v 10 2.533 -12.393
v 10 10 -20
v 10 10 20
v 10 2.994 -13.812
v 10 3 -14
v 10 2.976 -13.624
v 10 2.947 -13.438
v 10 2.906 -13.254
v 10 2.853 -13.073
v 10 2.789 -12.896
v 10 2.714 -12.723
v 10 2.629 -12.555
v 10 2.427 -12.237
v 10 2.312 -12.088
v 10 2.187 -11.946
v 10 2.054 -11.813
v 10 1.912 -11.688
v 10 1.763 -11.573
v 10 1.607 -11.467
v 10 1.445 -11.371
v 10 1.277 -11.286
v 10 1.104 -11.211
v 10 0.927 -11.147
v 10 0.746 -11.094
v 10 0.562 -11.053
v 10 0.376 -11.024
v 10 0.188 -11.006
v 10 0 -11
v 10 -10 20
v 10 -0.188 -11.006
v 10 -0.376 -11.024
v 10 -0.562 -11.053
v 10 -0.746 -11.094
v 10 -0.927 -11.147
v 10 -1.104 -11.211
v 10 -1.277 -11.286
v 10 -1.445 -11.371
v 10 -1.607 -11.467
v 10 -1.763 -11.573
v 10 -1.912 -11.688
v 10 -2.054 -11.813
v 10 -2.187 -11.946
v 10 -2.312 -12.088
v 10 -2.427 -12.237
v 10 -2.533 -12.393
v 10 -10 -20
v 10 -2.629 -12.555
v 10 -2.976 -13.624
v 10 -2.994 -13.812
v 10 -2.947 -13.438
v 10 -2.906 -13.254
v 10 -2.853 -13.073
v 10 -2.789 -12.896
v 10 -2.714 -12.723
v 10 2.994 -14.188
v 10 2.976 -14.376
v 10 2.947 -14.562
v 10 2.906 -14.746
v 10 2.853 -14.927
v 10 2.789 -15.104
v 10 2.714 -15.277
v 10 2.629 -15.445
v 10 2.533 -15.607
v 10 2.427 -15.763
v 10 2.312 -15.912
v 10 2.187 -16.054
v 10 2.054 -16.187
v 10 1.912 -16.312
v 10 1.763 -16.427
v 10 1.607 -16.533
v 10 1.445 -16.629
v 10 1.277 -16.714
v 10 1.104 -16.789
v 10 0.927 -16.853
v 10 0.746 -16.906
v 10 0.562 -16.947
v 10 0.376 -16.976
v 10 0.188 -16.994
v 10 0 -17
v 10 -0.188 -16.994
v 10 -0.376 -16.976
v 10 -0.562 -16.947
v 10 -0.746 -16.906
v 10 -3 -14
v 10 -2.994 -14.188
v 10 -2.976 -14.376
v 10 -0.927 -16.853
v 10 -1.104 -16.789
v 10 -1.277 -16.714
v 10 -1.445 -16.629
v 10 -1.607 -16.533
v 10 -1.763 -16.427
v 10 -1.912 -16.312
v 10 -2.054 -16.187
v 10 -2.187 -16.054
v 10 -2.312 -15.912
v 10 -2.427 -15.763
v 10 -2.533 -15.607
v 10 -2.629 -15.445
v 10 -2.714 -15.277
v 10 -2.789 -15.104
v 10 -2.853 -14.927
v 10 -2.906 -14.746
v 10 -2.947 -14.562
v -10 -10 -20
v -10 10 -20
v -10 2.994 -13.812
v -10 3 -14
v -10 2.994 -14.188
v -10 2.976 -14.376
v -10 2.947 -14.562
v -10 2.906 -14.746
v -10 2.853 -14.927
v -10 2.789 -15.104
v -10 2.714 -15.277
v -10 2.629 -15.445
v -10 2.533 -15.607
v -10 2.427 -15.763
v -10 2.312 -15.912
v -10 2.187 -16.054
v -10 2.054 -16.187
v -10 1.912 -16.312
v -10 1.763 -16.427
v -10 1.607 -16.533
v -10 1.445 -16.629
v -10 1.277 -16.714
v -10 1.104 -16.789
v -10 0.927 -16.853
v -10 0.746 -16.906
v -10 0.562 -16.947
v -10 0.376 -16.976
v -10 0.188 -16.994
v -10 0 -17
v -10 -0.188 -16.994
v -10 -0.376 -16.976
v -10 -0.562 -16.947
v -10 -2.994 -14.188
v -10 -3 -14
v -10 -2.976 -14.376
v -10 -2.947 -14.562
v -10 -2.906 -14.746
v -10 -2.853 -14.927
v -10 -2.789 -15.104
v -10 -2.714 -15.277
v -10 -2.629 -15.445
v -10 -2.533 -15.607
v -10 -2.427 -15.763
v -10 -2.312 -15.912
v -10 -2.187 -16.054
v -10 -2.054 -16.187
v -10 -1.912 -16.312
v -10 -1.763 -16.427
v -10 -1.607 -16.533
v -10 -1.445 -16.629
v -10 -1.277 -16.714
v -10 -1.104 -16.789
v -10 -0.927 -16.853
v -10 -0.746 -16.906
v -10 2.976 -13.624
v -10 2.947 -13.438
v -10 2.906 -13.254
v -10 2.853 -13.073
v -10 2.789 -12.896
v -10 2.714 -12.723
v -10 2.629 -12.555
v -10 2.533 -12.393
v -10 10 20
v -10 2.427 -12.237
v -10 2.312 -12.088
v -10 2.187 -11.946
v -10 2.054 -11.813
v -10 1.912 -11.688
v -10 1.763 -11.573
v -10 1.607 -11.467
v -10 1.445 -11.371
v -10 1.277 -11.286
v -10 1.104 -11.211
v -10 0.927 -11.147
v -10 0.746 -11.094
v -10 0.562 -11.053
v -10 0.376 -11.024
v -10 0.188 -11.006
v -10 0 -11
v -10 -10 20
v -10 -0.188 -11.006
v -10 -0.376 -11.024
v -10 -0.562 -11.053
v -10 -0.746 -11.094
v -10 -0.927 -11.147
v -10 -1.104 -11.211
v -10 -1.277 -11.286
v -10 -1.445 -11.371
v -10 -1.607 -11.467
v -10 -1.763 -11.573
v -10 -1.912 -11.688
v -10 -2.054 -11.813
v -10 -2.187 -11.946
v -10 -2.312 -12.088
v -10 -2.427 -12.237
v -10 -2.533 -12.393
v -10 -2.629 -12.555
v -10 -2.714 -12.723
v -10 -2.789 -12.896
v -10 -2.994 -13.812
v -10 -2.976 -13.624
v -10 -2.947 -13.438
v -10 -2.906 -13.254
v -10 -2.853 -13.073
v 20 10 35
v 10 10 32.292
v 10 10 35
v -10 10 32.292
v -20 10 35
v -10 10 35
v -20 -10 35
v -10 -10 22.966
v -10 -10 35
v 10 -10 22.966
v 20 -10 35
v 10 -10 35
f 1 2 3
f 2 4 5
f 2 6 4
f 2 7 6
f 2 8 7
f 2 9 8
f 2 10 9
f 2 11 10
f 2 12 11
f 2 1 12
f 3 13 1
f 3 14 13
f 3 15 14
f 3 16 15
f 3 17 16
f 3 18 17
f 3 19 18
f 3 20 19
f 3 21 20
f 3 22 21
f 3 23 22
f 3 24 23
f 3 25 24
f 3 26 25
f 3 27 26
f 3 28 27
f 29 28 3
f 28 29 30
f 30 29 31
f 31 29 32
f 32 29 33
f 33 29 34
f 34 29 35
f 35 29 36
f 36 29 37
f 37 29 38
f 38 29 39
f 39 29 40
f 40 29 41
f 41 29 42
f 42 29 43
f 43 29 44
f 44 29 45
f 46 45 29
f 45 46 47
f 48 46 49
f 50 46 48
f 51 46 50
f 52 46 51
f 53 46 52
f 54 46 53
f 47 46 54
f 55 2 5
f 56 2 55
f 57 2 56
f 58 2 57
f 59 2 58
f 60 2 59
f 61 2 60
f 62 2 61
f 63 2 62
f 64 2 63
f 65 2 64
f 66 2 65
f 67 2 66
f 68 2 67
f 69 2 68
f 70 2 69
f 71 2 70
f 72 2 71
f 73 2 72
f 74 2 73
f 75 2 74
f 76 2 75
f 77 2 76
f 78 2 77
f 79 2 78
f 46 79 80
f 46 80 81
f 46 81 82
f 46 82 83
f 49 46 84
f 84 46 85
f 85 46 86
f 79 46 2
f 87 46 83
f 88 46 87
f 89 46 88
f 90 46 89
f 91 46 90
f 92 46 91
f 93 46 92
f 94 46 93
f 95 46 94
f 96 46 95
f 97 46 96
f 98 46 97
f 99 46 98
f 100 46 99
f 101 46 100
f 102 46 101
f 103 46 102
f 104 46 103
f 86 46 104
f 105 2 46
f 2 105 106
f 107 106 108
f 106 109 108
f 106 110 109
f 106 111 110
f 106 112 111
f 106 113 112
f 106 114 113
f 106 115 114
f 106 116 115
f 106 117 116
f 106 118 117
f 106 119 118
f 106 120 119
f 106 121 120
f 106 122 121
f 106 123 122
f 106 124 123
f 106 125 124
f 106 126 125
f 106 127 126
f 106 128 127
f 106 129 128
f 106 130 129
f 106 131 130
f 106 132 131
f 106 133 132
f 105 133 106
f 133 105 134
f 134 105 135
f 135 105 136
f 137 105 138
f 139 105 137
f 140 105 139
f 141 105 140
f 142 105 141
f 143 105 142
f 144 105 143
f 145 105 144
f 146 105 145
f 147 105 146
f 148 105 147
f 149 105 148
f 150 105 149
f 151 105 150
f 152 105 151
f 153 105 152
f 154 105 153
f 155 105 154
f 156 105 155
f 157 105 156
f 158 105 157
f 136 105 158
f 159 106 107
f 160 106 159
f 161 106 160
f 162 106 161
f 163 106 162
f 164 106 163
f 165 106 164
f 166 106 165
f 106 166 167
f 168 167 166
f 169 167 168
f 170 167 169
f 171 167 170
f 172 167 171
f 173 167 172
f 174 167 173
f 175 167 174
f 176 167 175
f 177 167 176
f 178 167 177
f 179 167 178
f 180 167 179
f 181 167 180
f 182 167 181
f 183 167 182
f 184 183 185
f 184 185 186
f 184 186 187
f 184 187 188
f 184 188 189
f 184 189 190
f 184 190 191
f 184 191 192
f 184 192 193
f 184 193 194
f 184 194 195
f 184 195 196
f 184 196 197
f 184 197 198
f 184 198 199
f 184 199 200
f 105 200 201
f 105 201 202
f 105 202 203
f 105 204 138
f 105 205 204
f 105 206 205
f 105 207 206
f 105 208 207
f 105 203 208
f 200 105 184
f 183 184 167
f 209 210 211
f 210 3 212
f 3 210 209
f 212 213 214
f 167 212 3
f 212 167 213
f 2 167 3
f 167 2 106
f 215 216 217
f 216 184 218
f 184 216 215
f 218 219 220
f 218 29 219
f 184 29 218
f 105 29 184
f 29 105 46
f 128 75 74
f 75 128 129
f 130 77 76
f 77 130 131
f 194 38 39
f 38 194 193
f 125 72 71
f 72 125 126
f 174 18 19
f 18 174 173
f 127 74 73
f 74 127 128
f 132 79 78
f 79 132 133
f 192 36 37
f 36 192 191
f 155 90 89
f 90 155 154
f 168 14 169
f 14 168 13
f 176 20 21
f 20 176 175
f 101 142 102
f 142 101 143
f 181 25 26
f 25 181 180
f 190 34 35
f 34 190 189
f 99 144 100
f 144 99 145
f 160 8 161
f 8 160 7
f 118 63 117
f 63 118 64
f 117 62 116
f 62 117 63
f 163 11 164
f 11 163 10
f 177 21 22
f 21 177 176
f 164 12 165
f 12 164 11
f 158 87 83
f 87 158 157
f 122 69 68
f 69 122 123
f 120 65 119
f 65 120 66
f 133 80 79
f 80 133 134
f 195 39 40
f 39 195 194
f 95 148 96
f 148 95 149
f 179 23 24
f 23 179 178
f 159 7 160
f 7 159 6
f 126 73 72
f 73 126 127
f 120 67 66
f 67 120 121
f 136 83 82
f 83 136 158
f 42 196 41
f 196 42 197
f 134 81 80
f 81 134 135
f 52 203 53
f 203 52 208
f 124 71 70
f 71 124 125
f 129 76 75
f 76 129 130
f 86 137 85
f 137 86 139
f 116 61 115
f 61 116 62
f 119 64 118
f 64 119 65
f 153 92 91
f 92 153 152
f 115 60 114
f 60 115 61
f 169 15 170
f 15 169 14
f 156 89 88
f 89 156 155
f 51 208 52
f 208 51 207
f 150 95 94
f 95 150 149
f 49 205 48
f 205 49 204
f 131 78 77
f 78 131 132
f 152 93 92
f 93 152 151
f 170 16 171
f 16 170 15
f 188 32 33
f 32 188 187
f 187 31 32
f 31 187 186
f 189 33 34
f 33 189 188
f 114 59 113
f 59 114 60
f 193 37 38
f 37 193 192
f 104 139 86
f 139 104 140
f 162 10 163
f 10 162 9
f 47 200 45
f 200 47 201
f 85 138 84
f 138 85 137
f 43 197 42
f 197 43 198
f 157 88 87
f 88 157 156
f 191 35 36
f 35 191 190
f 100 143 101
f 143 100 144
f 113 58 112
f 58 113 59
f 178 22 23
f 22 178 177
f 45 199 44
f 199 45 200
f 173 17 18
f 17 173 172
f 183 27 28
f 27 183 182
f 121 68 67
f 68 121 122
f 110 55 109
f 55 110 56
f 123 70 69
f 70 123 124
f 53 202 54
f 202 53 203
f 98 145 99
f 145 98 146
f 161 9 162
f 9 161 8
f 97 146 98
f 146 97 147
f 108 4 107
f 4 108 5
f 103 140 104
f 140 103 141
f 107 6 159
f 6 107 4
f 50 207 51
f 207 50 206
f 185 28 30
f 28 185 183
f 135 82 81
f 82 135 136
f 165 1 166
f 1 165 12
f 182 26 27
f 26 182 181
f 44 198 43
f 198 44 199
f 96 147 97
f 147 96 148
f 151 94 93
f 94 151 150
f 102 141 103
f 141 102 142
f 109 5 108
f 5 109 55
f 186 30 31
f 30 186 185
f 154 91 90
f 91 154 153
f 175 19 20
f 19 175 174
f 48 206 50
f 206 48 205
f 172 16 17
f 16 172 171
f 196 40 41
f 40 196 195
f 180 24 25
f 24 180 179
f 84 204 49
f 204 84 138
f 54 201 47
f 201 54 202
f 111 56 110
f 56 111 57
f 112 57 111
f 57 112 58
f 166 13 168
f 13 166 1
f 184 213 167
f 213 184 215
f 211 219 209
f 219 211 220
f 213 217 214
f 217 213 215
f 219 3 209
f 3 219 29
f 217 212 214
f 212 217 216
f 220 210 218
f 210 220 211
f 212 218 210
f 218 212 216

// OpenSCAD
//cube dimensions


// ---------------CHANGEABLE VARIABLES---------------
//Step head
step_height = 15;
step_width = 20;
step_number = 0;

B = 40;
b = 20;

//Cube
cube_height = 40;


// ---------------STATIC VARIABLES---------------
$fn = 100;
make_lowerpart(step_width,step_width,cube_height+(step_height*step_number));


module make_lowerpart(cube_lengthX,cube_widthY,cube_heightZ){

    difference(){
        //Making the buttom cube
        cube([cube_lengthX,cube_widthY,cube_heightZ], center=true);
    
        //making the hole in buttomsection
        translate([0,0,-(cube_heightZ/2)+3*2])
            rotate(a=90, v=[0,1,0])
                cylinder(h=cube_lengthX*2,r=3, center=true);
    } 
 

 
 difference(){
    //making the head
    translate([0,0,cube_heightZ/2+step_height/2])
        rotate([270,0,0])
            linear_extrude(height = cube_lengthX,center=true)
                polygon (points = [
                    [-B/2, -step_height/2],
                    [-b/2, step_height/2],
                    [b/2, step_height/2],
                    [B/2, -step_height/2]
                ]); 

    translate([0,-cube_widthY/2,cube_heightZ-6])
        rotate([25,0,0])
            cube([cube_lengthX,cube_widthY+20,20], center=true);
 }

}


// ---------------OTHER PARTS---------------

//making the body cylinder
    //translate([cube_lengthX/2,0,cube_heightZ-5])
        //color("green")cylinder(20,cube_widthY/2,cube_widthY/2);
